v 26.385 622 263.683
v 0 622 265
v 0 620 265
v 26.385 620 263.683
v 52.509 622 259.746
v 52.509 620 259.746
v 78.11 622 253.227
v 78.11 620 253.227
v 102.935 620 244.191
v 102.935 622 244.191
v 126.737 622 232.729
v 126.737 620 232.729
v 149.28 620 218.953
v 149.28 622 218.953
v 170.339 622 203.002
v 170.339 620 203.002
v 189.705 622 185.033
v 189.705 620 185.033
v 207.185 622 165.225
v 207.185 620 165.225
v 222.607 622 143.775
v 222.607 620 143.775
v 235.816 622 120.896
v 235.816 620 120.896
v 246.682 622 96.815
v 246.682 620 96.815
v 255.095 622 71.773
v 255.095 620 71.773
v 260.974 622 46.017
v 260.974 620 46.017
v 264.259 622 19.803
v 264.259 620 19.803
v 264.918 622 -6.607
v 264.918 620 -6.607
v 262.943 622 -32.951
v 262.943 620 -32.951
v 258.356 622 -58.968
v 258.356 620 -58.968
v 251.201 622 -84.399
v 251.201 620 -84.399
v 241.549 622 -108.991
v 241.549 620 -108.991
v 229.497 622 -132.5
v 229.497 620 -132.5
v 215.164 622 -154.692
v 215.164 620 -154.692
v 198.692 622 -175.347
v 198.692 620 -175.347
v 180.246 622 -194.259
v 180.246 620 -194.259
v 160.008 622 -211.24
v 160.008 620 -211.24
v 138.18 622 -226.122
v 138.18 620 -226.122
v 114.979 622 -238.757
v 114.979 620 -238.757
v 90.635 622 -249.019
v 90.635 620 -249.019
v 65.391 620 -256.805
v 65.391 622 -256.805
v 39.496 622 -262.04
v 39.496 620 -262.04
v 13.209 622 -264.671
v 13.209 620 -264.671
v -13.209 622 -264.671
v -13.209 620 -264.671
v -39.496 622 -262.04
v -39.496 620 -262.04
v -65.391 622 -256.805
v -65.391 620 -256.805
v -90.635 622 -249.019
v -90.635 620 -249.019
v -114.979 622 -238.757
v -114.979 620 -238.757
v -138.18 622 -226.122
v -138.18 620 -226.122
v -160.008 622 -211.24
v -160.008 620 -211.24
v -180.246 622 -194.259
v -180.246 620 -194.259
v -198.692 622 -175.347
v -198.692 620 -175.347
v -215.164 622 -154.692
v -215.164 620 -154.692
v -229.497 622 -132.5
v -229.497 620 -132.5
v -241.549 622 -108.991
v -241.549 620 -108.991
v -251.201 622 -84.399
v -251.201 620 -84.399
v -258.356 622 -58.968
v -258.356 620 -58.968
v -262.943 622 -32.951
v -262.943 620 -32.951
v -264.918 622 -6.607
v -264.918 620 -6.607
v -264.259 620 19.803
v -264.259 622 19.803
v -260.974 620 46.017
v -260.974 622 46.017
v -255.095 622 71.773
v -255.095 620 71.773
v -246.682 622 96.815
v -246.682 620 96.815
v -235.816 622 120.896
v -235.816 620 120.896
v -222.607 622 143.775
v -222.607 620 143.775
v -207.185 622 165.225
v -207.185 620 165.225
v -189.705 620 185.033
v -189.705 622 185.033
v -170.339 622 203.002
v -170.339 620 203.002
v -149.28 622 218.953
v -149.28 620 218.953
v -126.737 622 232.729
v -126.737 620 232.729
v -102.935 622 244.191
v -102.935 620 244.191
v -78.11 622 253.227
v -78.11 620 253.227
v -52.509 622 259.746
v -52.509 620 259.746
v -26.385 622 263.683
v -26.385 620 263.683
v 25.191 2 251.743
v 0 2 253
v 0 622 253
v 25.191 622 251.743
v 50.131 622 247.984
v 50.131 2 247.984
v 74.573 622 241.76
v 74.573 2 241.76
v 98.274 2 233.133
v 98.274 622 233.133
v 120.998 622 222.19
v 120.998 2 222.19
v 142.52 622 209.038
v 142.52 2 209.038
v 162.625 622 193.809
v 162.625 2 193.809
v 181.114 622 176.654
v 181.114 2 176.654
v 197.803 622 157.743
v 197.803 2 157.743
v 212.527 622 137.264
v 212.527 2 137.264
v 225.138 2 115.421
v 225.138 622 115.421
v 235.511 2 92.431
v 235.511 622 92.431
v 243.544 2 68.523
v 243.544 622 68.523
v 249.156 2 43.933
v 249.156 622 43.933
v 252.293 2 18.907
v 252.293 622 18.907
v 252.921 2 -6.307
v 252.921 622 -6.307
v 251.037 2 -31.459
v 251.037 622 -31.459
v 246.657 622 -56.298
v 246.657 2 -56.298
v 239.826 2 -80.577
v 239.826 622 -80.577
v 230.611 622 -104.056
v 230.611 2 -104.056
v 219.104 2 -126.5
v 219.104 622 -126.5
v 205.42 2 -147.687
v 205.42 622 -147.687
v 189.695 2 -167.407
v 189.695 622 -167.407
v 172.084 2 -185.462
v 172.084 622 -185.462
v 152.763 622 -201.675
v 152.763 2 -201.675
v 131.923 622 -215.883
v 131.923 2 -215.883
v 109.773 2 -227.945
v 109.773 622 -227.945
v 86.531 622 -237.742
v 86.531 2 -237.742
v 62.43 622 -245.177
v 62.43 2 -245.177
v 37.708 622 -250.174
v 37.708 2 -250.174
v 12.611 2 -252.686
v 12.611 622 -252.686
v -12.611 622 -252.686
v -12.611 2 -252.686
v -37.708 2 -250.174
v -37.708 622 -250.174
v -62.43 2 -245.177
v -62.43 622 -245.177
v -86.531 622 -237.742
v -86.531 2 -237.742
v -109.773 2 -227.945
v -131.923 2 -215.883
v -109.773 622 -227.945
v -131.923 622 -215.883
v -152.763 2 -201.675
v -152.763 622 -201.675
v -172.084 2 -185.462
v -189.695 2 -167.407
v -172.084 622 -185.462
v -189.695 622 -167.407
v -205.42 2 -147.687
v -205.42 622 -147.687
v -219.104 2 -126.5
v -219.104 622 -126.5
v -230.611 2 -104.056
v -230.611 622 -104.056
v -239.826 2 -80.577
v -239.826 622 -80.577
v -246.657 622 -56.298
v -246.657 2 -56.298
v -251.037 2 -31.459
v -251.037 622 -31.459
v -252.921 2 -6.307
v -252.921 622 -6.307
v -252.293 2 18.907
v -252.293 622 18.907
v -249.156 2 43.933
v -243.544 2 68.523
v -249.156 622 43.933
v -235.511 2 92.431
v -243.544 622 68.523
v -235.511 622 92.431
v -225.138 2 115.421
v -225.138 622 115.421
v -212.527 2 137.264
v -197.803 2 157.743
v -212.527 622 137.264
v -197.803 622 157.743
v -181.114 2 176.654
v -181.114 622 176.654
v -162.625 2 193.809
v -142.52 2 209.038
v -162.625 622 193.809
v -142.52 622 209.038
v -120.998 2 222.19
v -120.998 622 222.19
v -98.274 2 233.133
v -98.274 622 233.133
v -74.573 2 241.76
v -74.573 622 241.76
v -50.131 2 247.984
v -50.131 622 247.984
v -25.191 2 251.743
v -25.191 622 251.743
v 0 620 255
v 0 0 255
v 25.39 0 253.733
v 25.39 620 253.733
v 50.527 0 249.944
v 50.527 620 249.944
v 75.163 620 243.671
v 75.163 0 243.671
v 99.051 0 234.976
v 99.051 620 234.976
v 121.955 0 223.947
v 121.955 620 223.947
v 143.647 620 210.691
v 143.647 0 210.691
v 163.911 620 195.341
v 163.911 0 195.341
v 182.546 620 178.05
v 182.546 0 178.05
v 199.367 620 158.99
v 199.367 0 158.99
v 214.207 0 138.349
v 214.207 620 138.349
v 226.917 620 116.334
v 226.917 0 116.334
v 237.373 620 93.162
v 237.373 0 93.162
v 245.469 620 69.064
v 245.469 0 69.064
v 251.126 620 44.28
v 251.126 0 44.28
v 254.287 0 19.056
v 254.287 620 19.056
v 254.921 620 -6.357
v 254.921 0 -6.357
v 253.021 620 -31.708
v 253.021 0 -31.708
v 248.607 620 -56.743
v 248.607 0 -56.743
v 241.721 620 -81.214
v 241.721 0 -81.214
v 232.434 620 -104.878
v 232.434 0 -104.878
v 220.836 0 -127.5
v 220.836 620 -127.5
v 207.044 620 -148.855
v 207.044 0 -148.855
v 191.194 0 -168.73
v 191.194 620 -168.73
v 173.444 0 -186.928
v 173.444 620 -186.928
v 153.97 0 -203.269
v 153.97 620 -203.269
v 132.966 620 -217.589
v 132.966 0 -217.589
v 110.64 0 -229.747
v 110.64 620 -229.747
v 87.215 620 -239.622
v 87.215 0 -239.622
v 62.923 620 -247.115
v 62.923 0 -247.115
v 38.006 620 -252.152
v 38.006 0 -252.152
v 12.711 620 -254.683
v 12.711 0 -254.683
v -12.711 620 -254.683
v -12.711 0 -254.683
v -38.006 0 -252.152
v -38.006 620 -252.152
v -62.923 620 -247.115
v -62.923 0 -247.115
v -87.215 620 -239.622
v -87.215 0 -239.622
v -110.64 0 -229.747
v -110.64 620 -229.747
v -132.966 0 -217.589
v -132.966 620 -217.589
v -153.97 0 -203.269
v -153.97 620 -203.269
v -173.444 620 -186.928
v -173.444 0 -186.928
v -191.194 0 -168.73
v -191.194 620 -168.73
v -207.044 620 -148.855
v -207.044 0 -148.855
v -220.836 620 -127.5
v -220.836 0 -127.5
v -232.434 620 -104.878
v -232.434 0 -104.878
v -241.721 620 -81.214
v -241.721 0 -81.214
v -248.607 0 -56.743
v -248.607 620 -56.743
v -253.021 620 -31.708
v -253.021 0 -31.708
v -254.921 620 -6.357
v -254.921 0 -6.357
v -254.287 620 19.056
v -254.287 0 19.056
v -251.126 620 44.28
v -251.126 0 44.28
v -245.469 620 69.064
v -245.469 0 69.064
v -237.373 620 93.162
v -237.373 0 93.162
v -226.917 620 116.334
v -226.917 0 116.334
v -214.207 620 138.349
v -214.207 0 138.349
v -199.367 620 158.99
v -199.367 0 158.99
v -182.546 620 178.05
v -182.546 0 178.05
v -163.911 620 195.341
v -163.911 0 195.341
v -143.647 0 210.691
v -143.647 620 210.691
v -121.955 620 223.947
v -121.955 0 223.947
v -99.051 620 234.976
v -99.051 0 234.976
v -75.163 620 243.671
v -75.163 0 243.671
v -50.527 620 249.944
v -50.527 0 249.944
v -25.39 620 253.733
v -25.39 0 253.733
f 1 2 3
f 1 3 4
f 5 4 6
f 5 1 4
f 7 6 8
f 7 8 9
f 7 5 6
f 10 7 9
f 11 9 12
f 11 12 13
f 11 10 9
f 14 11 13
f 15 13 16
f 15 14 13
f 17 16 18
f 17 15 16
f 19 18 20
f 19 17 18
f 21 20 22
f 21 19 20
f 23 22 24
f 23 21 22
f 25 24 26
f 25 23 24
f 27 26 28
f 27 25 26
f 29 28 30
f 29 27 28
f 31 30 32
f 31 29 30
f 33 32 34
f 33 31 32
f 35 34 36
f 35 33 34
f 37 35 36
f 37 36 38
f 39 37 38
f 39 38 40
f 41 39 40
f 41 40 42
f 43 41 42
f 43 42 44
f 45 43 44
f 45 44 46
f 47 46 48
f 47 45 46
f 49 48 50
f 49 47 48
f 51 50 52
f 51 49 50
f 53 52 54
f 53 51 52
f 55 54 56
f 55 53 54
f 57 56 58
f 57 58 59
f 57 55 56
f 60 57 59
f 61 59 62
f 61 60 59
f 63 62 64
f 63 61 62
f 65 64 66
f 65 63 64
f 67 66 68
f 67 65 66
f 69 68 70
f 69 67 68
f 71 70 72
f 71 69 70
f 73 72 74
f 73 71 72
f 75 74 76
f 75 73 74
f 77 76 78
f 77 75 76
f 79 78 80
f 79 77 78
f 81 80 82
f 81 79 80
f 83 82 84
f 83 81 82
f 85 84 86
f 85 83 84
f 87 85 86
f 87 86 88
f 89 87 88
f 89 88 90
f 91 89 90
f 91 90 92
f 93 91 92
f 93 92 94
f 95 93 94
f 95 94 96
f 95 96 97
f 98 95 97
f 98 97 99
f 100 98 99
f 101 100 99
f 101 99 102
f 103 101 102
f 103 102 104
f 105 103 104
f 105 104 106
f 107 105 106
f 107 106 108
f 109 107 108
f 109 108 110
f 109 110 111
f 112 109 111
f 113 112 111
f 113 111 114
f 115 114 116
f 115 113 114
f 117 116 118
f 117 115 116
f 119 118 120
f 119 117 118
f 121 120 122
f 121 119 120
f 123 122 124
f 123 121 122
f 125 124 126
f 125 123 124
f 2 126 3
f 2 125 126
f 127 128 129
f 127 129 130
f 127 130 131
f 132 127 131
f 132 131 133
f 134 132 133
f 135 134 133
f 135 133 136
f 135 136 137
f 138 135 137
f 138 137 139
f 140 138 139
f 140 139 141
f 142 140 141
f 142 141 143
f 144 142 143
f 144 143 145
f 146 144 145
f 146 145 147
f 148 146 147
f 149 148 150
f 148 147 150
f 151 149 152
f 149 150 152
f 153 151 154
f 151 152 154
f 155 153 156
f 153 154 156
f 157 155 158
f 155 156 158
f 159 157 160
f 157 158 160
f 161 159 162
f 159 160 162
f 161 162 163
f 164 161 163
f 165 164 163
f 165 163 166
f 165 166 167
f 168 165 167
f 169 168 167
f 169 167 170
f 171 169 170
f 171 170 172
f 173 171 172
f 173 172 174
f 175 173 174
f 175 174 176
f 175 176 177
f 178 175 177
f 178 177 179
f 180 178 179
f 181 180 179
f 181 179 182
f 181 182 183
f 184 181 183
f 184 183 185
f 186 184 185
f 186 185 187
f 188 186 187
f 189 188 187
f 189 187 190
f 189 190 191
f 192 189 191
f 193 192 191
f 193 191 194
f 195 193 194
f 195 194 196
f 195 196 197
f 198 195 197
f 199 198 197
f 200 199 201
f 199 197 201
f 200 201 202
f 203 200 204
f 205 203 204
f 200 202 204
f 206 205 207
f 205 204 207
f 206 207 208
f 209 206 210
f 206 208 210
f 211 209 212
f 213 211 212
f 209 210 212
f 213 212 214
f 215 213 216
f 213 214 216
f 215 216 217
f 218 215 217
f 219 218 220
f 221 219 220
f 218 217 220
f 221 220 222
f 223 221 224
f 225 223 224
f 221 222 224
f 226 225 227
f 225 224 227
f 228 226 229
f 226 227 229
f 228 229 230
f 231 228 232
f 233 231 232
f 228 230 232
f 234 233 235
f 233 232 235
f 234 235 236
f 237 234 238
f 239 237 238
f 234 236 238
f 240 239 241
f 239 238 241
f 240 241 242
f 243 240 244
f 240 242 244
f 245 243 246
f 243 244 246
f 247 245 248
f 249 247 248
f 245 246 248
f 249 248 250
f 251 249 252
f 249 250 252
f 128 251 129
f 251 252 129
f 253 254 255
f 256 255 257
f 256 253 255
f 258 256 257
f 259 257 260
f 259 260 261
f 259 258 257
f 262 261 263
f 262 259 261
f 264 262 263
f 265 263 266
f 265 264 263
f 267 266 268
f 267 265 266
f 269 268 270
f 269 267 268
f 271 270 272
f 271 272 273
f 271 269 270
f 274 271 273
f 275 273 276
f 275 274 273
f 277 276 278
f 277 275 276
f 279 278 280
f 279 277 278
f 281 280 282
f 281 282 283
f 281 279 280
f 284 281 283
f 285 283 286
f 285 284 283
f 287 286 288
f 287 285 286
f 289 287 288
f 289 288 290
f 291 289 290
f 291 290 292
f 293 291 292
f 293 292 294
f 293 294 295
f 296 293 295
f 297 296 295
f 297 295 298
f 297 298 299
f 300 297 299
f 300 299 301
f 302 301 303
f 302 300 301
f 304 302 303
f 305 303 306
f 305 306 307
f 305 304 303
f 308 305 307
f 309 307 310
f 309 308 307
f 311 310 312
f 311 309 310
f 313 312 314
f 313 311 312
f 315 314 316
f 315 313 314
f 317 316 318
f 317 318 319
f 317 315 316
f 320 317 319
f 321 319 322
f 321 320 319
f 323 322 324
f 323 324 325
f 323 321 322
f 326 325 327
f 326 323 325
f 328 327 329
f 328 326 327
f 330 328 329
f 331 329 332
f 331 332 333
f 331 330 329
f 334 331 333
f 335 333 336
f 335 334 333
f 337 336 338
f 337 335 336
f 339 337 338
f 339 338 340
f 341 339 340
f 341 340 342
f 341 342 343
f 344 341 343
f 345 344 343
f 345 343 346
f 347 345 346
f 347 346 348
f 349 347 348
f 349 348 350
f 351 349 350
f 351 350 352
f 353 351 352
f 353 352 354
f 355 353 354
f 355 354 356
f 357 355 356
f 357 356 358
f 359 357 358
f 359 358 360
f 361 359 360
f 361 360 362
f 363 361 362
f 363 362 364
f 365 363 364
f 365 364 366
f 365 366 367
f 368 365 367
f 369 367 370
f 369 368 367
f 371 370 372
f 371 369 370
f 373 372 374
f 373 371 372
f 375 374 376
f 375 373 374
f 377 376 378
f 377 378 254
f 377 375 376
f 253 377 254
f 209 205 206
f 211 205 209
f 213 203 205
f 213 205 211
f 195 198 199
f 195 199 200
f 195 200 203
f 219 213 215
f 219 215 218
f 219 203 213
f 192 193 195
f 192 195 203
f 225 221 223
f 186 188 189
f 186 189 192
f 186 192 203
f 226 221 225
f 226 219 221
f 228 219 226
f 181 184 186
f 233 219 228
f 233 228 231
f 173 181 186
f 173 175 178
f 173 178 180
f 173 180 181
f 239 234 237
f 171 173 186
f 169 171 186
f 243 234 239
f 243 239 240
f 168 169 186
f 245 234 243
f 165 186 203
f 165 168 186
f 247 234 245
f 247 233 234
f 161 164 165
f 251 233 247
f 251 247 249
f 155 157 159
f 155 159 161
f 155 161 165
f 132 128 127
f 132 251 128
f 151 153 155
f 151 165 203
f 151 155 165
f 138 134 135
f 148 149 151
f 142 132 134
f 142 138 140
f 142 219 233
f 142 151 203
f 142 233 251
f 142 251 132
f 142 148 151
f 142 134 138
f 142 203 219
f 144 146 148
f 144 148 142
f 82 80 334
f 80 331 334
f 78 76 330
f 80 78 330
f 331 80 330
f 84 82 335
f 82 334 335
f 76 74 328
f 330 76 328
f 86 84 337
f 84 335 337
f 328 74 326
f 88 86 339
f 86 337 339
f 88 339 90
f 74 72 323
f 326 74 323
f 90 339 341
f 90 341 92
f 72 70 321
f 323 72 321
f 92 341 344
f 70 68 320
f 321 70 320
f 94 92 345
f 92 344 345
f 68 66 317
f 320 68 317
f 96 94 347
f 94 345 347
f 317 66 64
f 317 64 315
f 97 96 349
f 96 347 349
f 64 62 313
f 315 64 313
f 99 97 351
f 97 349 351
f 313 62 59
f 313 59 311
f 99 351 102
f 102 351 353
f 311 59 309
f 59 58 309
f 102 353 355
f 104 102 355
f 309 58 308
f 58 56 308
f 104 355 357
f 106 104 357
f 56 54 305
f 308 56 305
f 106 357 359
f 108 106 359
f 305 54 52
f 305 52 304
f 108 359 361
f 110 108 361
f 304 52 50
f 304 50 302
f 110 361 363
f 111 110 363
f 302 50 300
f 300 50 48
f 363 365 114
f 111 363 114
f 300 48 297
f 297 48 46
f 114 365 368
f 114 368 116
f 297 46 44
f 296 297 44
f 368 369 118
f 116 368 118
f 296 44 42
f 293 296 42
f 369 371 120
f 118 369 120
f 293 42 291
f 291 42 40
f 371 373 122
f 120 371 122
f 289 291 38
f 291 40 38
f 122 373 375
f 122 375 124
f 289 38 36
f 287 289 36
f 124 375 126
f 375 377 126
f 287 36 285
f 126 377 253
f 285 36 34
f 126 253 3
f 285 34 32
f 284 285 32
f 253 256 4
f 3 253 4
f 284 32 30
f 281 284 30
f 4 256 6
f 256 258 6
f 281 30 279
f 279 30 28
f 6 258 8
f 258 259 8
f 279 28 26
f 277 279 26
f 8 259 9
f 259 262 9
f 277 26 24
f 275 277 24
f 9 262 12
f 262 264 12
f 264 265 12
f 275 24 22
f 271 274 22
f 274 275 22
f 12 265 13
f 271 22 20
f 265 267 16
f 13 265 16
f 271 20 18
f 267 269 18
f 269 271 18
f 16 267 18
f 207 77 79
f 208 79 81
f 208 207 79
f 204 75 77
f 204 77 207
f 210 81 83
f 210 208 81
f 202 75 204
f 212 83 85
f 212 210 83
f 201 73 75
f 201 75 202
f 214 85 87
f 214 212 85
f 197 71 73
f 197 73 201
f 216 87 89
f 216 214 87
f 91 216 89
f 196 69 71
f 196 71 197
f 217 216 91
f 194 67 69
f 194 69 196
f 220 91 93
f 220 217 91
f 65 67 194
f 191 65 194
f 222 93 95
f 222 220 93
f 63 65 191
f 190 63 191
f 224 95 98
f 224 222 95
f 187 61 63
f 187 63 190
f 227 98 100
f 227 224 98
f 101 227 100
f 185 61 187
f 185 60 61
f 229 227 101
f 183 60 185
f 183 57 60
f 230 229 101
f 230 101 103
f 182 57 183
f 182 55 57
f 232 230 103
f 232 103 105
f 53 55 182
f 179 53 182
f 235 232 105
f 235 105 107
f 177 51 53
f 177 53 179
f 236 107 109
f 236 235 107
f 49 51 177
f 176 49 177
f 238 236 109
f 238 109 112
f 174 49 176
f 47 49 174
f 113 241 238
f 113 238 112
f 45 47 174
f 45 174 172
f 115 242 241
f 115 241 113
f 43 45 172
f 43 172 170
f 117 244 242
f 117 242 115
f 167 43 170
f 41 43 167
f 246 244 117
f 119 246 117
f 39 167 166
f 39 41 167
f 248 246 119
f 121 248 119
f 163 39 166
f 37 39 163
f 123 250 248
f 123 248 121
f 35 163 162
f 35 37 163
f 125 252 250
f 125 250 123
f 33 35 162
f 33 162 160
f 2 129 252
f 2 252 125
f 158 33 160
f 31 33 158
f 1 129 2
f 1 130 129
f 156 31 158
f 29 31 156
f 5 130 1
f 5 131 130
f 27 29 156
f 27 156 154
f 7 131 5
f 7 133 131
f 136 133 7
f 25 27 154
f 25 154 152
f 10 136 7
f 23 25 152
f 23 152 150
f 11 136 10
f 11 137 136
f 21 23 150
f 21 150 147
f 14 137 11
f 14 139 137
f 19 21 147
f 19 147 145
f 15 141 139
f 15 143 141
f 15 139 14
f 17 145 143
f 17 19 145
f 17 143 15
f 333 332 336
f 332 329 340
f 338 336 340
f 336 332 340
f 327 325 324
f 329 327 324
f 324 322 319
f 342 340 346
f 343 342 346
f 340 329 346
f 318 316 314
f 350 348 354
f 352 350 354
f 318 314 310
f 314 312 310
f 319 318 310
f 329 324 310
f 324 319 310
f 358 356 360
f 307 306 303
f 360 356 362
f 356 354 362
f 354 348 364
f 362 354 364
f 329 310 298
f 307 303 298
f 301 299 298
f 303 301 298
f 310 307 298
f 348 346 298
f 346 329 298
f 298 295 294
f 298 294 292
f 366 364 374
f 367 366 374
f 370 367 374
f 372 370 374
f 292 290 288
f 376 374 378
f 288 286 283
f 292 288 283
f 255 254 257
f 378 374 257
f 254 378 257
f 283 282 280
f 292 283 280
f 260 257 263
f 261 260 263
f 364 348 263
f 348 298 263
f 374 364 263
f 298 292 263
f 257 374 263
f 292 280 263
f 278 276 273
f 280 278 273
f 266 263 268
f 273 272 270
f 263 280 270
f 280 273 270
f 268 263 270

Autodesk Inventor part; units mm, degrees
ref_plane "YZ Plane" through (0, 0, 0) normal (1, 0, 0) x (0, 1, 0)
ref_plane "XZ Plane" through (0, 0, 0) normal (0, 1, 0) x (-1, 0, 0)
ref_plane "XY Plane" through (0, 0, 0) normal (0, 0, 1) x (1, 0, 0)
sketch "Sketch1" plane through (0, 0, 0) normal (1, 0, 0) x (0, 1, 0)
  line L0 (0, 0) -> (0, 255)
  line L1 (0, 255) -> (620, 255)
  line L2 (620, 255) -> (620, 265)
  line L3 (-124, 0) -> (744, 0) projected
  dimension "d0" = 620
  dimension "d1" = 255
  dimension "d2" = 10
surface revolve "RevolutionSrf1" sketch "Sketch1" angle 360 about axis through (0, -10, 0) along (0, 1, 0) shown yes curves L0 L1 L2
thicken "Thicken1" operation new thickness 2 both sides no extend neighbours no toward (0.0589628, 0, -0.9982602) faces at (-15.0355, 413.3333, 254.5563) (258.1049, 620, 5.6577) (70.5152, 0, 40.8296)
properties part number "smietnik1_srodek"
